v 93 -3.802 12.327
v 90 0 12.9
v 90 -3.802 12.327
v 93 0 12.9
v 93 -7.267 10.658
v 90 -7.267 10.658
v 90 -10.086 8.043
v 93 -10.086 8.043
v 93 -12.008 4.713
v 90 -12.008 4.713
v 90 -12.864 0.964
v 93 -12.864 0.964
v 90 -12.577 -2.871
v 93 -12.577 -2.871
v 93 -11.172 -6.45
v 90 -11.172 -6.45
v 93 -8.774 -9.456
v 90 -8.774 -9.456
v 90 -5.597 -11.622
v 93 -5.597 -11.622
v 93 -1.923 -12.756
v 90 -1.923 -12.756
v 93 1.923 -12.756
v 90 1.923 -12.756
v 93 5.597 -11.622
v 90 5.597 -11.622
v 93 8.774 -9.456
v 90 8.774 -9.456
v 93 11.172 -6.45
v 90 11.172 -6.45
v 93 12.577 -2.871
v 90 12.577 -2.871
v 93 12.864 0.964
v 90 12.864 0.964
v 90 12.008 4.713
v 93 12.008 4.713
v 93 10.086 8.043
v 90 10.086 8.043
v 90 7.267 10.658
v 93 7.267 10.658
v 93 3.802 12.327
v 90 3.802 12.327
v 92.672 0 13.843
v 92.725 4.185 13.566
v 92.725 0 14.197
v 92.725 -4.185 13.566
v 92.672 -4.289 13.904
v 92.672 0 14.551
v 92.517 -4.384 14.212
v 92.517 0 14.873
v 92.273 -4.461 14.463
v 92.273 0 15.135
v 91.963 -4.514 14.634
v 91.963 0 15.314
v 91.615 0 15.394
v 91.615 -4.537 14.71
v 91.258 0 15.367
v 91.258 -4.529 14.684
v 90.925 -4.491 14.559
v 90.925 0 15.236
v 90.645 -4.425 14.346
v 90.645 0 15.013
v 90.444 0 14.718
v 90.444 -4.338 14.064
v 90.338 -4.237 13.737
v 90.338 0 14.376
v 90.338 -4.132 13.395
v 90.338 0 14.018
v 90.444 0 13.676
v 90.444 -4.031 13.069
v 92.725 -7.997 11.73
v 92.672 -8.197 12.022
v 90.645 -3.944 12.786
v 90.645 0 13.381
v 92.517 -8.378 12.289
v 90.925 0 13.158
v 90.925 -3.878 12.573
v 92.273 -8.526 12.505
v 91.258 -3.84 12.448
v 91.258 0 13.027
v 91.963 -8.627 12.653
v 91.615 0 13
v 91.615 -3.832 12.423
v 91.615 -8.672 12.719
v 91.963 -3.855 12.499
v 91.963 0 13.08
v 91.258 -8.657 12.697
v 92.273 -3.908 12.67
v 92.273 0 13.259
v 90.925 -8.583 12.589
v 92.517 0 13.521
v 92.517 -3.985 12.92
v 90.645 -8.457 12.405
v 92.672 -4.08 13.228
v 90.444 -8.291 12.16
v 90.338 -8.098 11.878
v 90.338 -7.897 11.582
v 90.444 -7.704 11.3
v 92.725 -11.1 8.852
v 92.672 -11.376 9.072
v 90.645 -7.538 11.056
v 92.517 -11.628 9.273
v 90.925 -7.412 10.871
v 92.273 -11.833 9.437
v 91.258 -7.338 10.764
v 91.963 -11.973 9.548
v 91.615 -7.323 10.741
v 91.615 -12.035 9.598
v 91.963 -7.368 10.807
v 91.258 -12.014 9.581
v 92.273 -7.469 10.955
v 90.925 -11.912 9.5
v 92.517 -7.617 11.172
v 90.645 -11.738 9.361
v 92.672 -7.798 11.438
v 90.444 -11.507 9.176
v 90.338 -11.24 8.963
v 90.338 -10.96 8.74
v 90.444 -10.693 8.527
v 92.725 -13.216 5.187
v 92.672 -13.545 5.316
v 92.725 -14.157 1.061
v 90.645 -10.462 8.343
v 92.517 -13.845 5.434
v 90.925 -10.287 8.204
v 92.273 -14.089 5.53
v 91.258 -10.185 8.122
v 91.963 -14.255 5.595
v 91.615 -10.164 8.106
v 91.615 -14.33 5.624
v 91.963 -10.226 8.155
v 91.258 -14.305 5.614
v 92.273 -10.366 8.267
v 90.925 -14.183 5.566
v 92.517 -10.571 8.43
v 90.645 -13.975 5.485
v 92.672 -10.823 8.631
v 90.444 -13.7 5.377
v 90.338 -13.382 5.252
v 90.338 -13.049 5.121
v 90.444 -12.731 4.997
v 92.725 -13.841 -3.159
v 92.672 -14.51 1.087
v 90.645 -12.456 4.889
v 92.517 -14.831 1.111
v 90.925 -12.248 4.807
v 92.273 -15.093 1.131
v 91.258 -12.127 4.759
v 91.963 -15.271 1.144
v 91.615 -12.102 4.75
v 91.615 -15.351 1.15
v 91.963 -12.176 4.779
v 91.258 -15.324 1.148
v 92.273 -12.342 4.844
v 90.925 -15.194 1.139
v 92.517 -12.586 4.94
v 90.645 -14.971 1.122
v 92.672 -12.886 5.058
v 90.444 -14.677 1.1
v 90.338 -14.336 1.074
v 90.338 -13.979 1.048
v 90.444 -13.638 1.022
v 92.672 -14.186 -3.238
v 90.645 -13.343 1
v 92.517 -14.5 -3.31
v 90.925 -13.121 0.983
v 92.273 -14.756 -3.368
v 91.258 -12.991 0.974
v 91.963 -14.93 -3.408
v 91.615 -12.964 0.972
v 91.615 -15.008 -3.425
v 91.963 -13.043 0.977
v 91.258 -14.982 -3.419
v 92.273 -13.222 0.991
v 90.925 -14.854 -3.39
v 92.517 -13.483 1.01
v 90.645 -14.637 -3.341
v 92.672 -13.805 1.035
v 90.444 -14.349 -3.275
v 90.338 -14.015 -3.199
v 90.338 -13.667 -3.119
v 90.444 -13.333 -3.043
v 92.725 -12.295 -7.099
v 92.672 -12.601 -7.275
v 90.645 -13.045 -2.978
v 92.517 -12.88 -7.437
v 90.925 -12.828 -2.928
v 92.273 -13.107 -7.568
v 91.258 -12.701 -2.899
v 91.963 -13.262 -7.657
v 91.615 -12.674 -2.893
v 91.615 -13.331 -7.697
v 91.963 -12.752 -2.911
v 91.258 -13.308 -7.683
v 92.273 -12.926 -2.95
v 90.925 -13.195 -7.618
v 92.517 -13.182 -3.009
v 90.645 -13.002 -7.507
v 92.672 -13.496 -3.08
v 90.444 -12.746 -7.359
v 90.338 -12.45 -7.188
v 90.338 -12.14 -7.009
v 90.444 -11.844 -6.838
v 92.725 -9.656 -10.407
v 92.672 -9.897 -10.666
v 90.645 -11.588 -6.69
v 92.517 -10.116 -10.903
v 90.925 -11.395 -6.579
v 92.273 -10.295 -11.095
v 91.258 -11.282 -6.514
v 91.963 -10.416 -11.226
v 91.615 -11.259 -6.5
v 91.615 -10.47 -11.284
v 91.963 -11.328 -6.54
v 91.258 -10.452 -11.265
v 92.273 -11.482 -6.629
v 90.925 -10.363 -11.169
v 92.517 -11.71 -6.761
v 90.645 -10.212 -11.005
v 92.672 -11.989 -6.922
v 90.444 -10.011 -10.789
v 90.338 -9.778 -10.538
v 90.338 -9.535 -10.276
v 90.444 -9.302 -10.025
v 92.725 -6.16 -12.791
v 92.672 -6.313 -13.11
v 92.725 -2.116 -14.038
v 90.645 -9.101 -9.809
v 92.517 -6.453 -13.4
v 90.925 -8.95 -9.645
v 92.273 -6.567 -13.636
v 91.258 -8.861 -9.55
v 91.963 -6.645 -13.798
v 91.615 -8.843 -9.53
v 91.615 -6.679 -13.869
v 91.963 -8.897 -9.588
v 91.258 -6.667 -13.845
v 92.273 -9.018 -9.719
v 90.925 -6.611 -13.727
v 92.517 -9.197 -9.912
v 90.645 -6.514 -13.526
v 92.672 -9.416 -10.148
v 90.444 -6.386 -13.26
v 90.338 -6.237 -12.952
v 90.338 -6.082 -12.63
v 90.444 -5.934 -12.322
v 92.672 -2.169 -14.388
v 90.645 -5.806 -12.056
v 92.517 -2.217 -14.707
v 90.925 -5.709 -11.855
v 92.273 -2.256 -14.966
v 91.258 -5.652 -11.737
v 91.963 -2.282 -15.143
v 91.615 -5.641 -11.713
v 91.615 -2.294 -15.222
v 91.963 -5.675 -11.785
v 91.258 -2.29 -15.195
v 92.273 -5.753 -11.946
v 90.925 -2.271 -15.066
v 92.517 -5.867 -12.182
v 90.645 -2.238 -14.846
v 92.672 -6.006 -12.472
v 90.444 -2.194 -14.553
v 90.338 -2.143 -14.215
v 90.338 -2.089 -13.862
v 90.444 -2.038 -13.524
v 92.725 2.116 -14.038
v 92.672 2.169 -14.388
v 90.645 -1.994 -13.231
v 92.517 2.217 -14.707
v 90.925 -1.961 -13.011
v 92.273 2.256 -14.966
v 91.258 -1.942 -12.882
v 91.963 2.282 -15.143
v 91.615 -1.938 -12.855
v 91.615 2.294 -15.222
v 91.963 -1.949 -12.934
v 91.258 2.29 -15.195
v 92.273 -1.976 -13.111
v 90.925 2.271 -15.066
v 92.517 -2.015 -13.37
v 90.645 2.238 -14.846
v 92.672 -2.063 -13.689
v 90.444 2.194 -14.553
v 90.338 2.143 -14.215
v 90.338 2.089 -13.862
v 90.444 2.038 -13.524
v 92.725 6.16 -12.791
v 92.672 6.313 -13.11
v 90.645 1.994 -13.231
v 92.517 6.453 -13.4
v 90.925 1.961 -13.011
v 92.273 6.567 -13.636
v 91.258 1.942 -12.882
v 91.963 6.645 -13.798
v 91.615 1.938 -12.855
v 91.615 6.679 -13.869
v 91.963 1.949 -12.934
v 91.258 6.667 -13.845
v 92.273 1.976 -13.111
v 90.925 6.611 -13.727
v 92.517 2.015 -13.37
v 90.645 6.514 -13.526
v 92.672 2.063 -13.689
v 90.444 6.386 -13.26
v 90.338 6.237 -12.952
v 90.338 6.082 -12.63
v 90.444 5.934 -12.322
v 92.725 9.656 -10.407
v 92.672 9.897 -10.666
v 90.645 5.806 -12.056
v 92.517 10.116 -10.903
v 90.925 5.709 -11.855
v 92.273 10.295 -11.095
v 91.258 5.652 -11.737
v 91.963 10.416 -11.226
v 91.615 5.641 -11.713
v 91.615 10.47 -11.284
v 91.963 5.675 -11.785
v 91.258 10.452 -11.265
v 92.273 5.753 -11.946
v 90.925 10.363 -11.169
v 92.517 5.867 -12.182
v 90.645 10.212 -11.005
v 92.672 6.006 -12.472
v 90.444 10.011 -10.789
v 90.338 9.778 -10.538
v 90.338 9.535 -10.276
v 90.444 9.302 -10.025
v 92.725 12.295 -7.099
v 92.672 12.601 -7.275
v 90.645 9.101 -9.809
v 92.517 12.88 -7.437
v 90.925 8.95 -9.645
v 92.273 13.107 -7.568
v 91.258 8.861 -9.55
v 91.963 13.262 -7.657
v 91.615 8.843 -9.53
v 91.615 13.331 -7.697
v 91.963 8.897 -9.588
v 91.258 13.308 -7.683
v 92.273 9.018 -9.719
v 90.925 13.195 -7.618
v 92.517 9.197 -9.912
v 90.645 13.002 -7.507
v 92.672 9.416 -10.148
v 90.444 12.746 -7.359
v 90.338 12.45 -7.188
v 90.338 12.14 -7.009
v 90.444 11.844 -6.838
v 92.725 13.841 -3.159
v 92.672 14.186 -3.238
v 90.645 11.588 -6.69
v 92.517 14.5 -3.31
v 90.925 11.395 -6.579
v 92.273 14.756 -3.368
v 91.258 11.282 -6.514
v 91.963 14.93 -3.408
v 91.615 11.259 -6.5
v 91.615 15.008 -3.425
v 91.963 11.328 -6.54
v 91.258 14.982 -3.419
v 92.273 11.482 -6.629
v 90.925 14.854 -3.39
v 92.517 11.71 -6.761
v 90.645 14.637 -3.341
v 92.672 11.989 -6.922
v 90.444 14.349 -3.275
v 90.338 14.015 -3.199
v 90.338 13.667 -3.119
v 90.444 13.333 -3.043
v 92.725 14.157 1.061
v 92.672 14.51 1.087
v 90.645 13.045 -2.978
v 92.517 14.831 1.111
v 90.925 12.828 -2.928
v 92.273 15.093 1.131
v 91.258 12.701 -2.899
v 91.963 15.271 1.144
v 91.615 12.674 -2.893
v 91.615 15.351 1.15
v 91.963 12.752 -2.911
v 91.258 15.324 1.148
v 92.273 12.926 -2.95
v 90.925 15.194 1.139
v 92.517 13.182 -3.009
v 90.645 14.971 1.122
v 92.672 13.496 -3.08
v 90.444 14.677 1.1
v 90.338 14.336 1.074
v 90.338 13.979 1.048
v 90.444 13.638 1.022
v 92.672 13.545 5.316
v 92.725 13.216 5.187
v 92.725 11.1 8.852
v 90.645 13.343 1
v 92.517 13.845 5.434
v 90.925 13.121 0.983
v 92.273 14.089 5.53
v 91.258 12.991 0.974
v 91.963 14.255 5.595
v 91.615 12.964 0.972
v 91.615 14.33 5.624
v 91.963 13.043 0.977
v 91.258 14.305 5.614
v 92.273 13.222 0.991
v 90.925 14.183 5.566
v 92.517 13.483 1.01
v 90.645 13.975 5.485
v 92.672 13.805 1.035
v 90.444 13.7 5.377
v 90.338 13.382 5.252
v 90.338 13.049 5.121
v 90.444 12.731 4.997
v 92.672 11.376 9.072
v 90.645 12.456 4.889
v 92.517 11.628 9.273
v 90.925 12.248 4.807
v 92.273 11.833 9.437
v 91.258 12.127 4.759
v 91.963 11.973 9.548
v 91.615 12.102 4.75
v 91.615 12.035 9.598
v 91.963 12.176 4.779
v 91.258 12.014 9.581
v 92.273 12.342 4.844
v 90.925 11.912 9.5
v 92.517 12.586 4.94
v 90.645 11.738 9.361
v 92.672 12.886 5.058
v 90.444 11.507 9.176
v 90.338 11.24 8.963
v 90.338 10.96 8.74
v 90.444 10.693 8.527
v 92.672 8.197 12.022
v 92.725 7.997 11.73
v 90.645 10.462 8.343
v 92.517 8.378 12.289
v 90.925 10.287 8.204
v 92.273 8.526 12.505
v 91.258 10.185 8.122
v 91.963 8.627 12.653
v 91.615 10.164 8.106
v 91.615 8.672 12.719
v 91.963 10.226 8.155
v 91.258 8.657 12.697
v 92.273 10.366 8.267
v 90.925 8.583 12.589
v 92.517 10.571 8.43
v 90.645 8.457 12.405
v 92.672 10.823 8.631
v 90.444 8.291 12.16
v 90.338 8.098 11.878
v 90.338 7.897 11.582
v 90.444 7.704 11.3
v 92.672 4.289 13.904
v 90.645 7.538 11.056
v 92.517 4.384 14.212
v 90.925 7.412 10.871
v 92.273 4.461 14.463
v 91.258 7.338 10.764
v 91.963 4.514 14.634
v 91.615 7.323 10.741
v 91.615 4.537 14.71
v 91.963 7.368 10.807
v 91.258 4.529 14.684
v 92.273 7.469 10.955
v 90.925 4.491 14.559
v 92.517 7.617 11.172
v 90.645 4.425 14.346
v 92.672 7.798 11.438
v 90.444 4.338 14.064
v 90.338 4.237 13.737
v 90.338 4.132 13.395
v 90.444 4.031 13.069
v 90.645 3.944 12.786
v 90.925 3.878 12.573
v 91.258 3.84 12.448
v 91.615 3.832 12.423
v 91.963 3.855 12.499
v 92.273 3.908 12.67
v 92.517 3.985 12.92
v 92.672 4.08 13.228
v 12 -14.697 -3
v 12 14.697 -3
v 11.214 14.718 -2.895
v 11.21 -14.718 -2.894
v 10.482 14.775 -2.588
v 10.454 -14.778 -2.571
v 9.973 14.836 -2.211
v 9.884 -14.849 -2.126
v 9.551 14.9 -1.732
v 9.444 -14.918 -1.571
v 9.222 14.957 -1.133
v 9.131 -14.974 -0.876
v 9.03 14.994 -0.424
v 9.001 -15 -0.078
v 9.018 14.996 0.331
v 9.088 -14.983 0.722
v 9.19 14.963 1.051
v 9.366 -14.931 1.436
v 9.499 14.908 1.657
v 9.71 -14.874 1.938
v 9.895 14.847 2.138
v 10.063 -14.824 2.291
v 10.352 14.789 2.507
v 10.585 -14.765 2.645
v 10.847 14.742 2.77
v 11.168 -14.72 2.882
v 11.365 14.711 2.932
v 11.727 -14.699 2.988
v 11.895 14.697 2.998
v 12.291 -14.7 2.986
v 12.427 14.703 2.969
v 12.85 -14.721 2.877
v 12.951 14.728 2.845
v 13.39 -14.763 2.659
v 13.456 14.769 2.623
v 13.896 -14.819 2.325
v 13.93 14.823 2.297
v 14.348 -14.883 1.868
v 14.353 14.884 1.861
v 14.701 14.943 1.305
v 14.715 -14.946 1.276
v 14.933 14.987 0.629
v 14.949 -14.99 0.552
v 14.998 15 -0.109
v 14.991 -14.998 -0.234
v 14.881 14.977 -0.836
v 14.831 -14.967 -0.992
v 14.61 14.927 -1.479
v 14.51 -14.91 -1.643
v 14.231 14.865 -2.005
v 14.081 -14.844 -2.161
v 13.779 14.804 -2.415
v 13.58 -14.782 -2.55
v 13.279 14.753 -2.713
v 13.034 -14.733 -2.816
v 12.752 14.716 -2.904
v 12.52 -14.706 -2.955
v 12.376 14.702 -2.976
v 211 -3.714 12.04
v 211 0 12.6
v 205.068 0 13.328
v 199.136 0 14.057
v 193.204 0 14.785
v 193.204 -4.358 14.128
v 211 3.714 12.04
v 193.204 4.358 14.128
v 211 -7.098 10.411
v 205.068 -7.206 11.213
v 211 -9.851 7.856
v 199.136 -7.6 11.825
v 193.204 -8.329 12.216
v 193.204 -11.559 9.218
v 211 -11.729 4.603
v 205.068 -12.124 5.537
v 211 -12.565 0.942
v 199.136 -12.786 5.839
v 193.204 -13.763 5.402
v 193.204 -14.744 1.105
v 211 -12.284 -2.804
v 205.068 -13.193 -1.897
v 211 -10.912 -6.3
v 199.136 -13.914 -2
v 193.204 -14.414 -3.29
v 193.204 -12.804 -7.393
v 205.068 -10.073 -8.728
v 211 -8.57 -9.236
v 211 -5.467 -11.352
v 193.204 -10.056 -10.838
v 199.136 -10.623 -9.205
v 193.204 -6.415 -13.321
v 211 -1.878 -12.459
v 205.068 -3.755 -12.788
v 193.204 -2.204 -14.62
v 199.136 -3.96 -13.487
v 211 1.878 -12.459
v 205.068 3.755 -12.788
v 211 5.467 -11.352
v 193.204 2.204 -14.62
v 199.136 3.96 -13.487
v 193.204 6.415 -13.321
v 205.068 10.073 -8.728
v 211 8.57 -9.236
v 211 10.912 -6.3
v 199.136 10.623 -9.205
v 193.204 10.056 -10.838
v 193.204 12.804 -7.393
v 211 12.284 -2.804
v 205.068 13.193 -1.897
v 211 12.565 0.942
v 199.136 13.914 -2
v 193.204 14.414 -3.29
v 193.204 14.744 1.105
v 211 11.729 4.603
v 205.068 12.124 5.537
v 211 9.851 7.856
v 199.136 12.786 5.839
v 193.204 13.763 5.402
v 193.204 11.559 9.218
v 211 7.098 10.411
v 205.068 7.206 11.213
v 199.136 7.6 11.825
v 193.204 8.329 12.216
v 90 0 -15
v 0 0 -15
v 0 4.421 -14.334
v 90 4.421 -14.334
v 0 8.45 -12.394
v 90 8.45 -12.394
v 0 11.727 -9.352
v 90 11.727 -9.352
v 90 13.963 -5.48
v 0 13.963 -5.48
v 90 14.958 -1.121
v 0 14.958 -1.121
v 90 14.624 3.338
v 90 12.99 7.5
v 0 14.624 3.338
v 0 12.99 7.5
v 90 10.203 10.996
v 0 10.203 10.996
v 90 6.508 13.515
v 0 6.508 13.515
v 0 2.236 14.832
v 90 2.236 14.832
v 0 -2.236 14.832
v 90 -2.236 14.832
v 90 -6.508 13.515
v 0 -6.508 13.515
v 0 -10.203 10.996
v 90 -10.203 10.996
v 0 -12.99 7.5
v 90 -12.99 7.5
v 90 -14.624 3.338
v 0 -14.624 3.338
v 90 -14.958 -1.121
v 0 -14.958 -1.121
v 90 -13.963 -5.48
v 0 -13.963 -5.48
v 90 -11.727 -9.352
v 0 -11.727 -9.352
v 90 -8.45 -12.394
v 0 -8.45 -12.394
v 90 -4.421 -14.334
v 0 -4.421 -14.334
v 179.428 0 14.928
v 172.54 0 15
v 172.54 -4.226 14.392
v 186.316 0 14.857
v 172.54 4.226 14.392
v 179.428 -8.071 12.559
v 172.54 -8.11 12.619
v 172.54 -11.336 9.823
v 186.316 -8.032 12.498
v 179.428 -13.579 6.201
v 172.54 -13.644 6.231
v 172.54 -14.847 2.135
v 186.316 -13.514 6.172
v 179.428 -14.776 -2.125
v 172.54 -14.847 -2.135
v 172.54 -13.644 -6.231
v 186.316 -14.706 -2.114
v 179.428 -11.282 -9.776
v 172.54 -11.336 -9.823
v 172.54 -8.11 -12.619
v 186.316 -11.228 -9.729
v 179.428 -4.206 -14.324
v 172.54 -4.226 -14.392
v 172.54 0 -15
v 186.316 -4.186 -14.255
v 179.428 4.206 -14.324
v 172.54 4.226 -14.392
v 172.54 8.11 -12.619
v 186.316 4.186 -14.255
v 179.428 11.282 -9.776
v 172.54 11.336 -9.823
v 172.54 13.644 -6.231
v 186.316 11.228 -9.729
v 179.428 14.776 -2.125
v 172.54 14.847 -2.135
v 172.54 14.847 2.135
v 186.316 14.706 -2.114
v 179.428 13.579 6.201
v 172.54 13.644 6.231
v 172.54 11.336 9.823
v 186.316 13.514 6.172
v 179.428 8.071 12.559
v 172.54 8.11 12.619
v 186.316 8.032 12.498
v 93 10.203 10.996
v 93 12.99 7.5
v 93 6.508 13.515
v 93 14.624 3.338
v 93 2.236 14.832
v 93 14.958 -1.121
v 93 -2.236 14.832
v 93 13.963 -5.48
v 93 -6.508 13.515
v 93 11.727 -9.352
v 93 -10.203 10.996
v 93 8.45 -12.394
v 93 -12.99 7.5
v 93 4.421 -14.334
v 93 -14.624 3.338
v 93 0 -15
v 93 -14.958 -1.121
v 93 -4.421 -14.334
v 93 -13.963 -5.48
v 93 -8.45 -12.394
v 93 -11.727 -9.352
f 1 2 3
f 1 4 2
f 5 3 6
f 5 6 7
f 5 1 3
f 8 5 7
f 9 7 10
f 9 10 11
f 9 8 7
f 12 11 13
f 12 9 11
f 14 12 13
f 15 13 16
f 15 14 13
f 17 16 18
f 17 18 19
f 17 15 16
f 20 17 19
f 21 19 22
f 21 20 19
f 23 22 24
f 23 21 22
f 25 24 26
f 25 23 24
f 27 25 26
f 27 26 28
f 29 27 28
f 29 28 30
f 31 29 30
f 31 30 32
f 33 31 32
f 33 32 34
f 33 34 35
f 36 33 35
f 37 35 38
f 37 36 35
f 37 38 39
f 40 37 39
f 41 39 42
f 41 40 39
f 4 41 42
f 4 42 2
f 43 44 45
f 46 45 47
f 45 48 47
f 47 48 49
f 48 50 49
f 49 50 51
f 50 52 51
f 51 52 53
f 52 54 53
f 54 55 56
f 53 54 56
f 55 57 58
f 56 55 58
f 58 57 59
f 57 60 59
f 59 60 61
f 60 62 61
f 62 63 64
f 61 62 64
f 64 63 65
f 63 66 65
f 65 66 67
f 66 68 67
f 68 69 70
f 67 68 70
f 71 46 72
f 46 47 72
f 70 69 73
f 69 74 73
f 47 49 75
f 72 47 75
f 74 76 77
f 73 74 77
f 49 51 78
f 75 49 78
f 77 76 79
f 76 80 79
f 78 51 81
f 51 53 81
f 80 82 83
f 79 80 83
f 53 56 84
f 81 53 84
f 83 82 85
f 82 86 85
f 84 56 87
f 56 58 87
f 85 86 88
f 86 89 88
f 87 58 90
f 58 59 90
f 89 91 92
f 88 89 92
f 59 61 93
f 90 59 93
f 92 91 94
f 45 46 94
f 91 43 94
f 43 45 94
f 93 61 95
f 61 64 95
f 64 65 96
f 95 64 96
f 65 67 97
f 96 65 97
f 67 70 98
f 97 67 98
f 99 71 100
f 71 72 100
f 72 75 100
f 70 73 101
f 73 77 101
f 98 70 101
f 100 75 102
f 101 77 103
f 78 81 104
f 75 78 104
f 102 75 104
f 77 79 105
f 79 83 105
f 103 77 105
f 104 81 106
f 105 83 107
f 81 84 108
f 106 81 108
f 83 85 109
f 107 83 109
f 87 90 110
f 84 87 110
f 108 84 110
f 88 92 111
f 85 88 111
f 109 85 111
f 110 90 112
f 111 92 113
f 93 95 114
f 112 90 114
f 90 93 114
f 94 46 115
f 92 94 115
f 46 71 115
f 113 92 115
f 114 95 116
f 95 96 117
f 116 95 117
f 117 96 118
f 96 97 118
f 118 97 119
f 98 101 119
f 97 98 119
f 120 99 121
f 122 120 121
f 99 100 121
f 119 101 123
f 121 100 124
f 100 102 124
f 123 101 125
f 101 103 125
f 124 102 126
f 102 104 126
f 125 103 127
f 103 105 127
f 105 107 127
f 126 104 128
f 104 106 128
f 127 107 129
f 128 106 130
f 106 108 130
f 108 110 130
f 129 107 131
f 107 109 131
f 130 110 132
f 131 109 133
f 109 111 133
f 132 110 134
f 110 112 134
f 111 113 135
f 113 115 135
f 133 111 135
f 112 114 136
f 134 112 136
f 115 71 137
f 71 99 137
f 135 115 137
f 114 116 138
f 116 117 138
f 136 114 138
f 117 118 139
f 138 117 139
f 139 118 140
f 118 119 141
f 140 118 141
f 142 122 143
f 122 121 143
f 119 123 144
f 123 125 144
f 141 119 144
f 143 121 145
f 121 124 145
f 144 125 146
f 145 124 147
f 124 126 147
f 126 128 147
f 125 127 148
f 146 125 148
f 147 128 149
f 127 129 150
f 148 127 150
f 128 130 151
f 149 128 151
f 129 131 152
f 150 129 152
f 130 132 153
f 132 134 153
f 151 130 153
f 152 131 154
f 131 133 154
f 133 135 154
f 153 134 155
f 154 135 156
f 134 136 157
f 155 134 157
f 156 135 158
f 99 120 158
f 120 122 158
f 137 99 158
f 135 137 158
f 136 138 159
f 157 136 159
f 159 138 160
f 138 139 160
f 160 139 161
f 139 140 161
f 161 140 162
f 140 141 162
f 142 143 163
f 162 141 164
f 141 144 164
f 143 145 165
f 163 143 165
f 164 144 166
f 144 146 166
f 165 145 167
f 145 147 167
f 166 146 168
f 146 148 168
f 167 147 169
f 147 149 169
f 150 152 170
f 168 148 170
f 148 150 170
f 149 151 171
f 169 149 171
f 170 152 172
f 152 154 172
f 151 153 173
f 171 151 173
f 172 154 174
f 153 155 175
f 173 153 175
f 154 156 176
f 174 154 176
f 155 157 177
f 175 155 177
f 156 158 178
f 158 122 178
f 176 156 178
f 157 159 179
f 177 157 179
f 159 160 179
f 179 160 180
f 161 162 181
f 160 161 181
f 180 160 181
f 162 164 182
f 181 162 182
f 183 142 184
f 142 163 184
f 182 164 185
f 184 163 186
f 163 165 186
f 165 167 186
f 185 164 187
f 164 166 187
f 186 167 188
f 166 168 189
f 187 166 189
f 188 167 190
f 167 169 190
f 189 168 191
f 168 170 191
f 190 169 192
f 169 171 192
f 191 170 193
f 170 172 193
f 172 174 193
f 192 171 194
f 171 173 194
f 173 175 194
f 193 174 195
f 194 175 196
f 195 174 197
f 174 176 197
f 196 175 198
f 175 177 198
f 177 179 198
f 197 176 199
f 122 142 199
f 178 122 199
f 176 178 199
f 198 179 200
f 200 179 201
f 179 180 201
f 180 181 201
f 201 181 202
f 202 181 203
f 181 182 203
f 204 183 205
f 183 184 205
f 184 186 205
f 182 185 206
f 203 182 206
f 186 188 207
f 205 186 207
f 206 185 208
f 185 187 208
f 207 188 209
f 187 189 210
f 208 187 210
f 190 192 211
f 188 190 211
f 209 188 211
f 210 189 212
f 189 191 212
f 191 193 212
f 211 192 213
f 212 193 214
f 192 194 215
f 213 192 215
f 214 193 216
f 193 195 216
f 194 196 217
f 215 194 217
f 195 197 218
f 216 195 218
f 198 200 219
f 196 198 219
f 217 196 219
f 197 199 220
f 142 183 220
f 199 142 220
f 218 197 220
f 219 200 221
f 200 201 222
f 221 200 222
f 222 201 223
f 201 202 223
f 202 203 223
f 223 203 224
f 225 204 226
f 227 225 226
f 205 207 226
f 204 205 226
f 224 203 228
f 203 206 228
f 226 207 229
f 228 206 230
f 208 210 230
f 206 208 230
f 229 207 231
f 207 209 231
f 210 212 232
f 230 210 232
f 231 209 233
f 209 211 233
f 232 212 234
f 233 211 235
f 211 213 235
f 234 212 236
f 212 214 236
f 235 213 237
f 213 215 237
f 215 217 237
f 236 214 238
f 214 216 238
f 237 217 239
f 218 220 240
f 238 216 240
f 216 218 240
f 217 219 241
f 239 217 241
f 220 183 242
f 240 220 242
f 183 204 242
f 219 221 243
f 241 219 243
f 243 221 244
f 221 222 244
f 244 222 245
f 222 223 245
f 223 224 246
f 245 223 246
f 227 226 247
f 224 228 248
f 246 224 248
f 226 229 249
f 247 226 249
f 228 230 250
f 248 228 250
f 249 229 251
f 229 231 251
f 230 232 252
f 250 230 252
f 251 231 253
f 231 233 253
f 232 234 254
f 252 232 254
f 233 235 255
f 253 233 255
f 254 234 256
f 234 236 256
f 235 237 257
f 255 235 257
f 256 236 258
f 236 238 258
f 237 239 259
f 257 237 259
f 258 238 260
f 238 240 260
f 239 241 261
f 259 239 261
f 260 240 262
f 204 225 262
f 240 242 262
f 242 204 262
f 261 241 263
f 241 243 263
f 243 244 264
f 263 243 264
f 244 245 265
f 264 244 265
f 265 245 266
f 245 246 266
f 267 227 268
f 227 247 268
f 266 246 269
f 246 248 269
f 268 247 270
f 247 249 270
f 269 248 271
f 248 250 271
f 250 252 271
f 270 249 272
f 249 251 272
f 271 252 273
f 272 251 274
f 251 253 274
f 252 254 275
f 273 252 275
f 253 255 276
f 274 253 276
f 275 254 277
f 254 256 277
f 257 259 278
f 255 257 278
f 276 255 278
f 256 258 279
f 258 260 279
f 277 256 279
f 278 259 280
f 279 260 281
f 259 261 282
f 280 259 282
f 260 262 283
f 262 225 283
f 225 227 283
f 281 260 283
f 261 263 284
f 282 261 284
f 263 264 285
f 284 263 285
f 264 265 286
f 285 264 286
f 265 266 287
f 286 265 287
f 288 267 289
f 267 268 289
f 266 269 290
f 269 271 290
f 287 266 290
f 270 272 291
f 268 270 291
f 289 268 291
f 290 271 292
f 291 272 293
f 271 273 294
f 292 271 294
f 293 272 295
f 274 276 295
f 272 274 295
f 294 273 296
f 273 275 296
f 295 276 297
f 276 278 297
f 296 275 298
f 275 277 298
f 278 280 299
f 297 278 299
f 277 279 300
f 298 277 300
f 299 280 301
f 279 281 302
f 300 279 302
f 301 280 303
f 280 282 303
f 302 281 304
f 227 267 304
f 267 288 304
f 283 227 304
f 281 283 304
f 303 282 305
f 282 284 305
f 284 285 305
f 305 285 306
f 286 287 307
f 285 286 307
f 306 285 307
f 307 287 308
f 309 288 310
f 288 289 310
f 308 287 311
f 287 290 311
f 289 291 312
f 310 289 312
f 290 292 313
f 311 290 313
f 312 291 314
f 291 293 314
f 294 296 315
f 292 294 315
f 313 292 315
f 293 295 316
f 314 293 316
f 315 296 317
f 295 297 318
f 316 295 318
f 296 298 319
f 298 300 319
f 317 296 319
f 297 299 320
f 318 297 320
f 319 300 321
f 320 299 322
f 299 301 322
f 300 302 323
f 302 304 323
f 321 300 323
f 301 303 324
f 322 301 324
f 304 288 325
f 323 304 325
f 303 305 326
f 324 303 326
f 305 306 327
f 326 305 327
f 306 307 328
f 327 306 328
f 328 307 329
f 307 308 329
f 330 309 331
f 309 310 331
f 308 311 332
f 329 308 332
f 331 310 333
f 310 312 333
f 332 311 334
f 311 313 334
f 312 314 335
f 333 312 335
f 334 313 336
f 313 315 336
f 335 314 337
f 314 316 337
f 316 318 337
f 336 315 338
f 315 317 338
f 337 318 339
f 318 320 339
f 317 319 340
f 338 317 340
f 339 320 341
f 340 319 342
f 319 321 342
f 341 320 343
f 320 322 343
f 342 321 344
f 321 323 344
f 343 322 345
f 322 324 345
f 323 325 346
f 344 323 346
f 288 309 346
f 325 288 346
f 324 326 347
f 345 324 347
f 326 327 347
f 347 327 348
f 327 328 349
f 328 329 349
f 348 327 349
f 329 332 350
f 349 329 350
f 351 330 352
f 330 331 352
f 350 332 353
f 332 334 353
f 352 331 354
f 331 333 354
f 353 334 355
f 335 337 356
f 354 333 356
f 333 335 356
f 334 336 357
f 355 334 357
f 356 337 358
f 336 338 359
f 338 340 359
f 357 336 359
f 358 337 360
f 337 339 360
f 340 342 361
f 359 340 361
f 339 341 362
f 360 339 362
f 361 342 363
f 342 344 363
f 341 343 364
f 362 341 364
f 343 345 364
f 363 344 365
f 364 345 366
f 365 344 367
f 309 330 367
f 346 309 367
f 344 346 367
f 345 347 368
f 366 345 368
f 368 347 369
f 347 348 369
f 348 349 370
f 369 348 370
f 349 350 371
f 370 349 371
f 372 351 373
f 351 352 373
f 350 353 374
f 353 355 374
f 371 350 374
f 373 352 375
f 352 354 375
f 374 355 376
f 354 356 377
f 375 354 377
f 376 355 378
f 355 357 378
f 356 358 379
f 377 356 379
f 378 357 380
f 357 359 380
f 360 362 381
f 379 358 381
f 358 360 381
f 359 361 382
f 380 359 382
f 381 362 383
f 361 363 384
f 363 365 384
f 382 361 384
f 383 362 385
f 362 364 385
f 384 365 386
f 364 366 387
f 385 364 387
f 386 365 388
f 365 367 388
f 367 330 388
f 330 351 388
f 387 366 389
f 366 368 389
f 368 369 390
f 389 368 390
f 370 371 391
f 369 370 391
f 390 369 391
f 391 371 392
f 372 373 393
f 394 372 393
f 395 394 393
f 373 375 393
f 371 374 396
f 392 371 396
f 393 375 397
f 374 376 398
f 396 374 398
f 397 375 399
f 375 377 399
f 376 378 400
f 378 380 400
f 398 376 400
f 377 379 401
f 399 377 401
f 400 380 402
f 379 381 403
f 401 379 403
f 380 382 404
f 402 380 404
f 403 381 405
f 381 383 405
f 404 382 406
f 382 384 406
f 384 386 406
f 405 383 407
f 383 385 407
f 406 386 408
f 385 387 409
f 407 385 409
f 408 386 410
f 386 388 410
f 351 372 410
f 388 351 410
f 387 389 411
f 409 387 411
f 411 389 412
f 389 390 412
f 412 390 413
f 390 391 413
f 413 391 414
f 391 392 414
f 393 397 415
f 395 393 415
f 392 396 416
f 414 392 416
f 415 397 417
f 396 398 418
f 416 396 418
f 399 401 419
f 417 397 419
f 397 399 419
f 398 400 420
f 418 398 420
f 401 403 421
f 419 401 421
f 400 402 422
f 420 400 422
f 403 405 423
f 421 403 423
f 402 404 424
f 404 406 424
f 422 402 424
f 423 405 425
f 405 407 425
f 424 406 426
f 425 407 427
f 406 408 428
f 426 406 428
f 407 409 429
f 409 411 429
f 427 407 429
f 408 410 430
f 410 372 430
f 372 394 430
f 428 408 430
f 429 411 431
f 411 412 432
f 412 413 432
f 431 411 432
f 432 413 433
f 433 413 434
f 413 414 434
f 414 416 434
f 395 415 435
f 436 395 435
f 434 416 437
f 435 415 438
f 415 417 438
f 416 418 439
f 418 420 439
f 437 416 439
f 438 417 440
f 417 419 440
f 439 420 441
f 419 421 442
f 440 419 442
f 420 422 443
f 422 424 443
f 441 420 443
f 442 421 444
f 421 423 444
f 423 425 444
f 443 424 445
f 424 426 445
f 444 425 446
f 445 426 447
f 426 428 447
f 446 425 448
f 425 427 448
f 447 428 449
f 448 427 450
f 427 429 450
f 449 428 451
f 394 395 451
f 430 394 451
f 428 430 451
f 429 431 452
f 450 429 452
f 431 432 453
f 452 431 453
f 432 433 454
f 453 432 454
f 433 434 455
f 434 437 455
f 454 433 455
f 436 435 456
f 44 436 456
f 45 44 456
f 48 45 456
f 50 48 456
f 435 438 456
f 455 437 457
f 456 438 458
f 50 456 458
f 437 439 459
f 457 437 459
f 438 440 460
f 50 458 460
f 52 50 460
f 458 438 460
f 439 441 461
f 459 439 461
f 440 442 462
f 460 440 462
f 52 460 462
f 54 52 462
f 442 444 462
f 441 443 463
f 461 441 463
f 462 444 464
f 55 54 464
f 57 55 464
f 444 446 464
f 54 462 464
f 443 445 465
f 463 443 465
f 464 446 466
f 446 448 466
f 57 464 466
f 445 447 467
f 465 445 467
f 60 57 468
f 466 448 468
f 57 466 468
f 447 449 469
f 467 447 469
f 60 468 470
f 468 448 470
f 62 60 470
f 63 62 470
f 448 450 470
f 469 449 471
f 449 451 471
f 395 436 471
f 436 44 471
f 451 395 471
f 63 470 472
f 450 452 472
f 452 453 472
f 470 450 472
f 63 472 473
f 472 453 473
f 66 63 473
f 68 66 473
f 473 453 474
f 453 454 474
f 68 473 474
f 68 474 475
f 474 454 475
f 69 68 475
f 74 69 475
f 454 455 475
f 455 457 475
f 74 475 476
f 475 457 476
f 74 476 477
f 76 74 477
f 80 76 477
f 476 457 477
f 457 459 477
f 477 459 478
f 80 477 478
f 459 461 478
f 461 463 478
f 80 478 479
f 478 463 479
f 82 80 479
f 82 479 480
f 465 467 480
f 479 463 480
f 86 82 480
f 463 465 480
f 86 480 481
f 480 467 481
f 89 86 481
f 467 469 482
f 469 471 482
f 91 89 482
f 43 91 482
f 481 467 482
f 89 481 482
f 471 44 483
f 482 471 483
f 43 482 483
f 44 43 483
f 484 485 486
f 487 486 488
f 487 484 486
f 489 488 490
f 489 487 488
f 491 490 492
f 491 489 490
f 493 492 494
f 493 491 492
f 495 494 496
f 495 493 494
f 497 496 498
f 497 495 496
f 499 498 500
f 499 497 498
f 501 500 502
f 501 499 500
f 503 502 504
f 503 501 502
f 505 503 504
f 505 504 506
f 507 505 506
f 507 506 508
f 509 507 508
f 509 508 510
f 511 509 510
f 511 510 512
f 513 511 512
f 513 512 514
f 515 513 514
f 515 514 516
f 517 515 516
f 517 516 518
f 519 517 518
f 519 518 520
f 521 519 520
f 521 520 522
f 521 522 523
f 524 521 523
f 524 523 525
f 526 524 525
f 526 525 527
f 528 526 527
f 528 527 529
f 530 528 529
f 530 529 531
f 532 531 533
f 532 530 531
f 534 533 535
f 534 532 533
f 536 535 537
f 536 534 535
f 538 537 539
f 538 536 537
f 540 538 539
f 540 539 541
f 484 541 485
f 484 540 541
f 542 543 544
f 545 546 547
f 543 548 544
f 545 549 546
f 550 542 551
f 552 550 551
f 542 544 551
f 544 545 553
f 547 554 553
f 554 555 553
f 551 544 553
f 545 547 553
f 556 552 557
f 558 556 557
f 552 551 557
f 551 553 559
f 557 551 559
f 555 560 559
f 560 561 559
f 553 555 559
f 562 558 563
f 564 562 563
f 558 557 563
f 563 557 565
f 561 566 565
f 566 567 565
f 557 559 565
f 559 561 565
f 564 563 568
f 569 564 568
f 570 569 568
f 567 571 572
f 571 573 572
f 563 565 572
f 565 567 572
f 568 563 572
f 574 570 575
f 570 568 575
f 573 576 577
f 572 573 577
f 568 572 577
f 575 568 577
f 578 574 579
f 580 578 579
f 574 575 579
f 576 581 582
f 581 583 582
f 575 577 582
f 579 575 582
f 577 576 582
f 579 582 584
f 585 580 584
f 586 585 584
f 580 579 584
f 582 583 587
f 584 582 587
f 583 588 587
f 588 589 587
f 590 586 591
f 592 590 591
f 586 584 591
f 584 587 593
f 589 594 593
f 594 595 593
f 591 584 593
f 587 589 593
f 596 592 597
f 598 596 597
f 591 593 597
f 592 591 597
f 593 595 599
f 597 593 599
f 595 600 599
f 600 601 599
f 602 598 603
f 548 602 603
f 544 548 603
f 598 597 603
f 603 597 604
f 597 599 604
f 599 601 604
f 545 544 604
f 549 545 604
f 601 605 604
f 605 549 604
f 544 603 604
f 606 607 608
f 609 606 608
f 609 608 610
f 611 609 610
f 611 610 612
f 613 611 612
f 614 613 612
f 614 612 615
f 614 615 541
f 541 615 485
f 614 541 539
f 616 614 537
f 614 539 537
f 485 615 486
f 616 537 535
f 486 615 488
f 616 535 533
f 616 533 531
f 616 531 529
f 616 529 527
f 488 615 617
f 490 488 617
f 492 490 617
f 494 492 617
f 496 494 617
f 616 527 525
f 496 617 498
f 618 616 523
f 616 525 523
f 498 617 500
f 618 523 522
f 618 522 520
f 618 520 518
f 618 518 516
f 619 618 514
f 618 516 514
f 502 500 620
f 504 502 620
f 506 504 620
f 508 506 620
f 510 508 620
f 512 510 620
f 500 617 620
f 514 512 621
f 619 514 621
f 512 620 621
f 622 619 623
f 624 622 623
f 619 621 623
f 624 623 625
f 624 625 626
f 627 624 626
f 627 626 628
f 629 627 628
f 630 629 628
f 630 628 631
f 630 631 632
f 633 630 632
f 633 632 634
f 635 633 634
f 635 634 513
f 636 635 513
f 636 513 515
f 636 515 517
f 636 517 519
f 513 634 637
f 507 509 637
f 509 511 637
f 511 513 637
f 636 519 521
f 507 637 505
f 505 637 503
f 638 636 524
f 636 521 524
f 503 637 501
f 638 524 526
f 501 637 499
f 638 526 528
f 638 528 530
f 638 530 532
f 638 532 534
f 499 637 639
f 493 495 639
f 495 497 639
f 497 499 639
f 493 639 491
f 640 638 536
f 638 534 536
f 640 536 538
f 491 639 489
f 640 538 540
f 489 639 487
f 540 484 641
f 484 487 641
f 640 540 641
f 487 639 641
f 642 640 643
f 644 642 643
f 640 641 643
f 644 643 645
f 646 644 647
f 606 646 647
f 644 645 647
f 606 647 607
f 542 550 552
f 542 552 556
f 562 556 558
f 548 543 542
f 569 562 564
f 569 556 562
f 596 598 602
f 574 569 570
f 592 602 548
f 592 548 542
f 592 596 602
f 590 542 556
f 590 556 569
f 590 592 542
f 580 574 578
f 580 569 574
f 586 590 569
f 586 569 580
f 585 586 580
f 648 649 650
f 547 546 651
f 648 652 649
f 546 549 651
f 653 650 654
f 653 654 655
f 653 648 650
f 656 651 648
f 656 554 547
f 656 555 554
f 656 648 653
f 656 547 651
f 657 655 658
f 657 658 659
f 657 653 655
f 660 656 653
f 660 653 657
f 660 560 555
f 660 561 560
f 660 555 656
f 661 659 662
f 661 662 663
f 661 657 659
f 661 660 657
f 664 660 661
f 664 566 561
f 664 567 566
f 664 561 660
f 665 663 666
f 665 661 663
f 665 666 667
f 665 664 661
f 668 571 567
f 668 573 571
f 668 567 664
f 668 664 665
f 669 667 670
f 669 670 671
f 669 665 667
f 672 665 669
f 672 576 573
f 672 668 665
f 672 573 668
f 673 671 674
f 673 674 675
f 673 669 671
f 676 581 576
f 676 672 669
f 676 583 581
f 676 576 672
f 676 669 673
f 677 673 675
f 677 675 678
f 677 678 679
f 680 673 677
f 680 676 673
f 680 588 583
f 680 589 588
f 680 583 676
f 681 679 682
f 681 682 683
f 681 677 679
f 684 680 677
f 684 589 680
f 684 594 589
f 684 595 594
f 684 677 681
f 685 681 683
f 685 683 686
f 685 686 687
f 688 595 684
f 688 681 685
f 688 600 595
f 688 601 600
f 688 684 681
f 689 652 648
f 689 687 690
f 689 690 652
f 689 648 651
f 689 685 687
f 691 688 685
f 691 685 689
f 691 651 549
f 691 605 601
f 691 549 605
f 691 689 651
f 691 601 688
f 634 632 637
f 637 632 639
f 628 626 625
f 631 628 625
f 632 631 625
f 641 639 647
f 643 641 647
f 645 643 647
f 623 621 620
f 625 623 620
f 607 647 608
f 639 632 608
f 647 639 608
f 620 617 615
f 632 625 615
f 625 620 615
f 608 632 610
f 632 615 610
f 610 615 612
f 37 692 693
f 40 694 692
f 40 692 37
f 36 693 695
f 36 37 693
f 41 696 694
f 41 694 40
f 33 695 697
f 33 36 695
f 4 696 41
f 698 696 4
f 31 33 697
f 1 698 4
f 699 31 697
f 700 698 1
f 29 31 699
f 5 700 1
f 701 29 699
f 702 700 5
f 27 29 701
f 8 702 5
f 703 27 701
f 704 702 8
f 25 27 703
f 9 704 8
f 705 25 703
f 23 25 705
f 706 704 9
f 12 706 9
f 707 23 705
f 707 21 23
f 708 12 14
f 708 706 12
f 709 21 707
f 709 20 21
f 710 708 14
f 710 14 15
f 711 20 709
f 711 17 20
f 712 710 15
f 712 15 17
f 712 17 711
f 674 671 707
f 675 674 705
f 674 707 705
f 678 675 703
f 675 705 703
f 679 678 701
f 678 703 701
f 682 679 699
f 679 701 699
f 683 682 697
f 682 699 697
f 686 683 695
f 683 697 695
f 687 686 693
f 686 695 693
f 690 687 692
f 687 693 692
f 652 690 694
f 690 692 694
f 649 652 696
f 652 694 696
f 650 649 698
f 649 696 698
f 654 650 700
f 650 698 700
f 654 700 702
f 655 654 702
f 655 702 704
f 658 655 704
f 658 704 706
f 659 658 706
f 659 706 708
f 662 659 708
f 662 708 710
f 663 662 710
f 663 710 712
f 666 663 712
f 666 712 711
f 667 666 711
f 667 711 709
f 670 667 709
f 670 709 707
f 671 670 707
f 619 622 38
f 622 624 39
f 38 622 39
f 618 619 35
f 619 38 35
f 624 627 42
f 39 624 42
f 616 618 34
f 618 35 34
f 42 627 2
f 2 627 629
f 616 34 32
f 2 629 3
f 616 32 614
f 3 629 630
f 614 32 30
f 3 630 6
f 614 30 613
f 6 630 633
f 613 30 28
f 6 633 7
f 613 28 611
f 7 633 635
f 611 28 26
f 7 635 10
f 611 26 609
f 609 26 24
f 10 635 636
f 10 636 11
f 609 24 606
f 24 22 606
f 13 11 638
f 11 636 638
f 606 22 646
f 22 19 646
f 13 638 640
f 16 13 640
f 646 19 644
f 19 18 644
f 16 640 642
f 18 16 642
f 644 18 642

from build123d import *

# Parameters (mm, degrees)
SKETCH1_R               = 15
BOSS_EXTRUDE1_DEPTH     = 211
CUT_EXTRUDE1_DEPTH      = 199
CUT_EXTRUDE1_DEPTH_BACK = 199
SKETCH2_R               = 3
CHAMFER1_SIZE           = 2
CHAMFER1_SIZE2          = 17.797060577
SKETCH4_W               = 3
SKETCH4_H               = 2.1
SKETCH5_R               = 1.2


with BuildPart() as part:
    # Sketch1 → Boss-Extrude1 (new body)
    with BuildSketch(Plane(origin=(0, 0, 0), x_dir=(0, 0, -1), z_dir=(1, 0, 0))):
        Circle(SKETCH1_R)
    extrude(amount=BOSS_EXTRUDE1_DEPTH)

    # Sketch2 → Cut-Extrude1 (cut, two sides: drawn at the far end of the back side and taken through both)
    with BuildSketch(Plane(origin=(0, 0, 0), x_dir=(1, 0, 0), z_dir=(0, 1, 0)).offset(-CUT_EXTRUDE1_DEPTH_BACK)):
        with Locations((12, 0)):
            Circle(SKETCH2_R)
    extrude(amount=CUT_EXTRUDE1_DEPTH + CUT_EXTRUDE1_DEPTH_BACK, mode=Mode.SUBTRACT)

    # Sketch3 → Cut-Revolve1 (revolve, cut)
    with BuildSketch(Plane.XY):
        Polygon((172.539848215, 15), (211, 14.6), (211, 15), align=None)
    revolve(axis=Axis((-16.667953377, 0, 0), (1, 0, 0)), mode=Mode.SUBTRACT)

    # Chamfer1
    chamfer1_edges = [part.edges().sort_by_distance(p)[0] for p in [
        (211, -14.6, 0),
    ]]
    chamfer1_side = [part.faces().sort_by_distance(p)[0] for p in [
        (211, 0, 0),
    ]]
    chamfer(chamfer1_edges, length=CHAMFER1_SIZE, length2=CHAMFER1_SIZE2, reference=chamfer1_side[0])

    # Sketch4 → Cut-Revolve2 (revolve, cut)
    with BuildSketch(Plane.XY):
        with Locations((91.5, 13.95)):
            Rectangle(SKETCH4_W, SKETCH4_H)
    revolve(axis=Axis((98.888949173, 0, 0), (1, 0, 0)), mode=Mode.SUBTRACT)


with BuildPart() as body_2:
    # Sketch5 → Revolve1 (revolve)
    with BuildSketch(Plane.XY):
        with Locations((91.525064223, 14.197033875)):
            Circle(SKETCH5_R)
    revolve(axis=Axis((65.206032182, 0, 0), (1, 0, 0)))


solid = Compound([part.part, body_2.part])
